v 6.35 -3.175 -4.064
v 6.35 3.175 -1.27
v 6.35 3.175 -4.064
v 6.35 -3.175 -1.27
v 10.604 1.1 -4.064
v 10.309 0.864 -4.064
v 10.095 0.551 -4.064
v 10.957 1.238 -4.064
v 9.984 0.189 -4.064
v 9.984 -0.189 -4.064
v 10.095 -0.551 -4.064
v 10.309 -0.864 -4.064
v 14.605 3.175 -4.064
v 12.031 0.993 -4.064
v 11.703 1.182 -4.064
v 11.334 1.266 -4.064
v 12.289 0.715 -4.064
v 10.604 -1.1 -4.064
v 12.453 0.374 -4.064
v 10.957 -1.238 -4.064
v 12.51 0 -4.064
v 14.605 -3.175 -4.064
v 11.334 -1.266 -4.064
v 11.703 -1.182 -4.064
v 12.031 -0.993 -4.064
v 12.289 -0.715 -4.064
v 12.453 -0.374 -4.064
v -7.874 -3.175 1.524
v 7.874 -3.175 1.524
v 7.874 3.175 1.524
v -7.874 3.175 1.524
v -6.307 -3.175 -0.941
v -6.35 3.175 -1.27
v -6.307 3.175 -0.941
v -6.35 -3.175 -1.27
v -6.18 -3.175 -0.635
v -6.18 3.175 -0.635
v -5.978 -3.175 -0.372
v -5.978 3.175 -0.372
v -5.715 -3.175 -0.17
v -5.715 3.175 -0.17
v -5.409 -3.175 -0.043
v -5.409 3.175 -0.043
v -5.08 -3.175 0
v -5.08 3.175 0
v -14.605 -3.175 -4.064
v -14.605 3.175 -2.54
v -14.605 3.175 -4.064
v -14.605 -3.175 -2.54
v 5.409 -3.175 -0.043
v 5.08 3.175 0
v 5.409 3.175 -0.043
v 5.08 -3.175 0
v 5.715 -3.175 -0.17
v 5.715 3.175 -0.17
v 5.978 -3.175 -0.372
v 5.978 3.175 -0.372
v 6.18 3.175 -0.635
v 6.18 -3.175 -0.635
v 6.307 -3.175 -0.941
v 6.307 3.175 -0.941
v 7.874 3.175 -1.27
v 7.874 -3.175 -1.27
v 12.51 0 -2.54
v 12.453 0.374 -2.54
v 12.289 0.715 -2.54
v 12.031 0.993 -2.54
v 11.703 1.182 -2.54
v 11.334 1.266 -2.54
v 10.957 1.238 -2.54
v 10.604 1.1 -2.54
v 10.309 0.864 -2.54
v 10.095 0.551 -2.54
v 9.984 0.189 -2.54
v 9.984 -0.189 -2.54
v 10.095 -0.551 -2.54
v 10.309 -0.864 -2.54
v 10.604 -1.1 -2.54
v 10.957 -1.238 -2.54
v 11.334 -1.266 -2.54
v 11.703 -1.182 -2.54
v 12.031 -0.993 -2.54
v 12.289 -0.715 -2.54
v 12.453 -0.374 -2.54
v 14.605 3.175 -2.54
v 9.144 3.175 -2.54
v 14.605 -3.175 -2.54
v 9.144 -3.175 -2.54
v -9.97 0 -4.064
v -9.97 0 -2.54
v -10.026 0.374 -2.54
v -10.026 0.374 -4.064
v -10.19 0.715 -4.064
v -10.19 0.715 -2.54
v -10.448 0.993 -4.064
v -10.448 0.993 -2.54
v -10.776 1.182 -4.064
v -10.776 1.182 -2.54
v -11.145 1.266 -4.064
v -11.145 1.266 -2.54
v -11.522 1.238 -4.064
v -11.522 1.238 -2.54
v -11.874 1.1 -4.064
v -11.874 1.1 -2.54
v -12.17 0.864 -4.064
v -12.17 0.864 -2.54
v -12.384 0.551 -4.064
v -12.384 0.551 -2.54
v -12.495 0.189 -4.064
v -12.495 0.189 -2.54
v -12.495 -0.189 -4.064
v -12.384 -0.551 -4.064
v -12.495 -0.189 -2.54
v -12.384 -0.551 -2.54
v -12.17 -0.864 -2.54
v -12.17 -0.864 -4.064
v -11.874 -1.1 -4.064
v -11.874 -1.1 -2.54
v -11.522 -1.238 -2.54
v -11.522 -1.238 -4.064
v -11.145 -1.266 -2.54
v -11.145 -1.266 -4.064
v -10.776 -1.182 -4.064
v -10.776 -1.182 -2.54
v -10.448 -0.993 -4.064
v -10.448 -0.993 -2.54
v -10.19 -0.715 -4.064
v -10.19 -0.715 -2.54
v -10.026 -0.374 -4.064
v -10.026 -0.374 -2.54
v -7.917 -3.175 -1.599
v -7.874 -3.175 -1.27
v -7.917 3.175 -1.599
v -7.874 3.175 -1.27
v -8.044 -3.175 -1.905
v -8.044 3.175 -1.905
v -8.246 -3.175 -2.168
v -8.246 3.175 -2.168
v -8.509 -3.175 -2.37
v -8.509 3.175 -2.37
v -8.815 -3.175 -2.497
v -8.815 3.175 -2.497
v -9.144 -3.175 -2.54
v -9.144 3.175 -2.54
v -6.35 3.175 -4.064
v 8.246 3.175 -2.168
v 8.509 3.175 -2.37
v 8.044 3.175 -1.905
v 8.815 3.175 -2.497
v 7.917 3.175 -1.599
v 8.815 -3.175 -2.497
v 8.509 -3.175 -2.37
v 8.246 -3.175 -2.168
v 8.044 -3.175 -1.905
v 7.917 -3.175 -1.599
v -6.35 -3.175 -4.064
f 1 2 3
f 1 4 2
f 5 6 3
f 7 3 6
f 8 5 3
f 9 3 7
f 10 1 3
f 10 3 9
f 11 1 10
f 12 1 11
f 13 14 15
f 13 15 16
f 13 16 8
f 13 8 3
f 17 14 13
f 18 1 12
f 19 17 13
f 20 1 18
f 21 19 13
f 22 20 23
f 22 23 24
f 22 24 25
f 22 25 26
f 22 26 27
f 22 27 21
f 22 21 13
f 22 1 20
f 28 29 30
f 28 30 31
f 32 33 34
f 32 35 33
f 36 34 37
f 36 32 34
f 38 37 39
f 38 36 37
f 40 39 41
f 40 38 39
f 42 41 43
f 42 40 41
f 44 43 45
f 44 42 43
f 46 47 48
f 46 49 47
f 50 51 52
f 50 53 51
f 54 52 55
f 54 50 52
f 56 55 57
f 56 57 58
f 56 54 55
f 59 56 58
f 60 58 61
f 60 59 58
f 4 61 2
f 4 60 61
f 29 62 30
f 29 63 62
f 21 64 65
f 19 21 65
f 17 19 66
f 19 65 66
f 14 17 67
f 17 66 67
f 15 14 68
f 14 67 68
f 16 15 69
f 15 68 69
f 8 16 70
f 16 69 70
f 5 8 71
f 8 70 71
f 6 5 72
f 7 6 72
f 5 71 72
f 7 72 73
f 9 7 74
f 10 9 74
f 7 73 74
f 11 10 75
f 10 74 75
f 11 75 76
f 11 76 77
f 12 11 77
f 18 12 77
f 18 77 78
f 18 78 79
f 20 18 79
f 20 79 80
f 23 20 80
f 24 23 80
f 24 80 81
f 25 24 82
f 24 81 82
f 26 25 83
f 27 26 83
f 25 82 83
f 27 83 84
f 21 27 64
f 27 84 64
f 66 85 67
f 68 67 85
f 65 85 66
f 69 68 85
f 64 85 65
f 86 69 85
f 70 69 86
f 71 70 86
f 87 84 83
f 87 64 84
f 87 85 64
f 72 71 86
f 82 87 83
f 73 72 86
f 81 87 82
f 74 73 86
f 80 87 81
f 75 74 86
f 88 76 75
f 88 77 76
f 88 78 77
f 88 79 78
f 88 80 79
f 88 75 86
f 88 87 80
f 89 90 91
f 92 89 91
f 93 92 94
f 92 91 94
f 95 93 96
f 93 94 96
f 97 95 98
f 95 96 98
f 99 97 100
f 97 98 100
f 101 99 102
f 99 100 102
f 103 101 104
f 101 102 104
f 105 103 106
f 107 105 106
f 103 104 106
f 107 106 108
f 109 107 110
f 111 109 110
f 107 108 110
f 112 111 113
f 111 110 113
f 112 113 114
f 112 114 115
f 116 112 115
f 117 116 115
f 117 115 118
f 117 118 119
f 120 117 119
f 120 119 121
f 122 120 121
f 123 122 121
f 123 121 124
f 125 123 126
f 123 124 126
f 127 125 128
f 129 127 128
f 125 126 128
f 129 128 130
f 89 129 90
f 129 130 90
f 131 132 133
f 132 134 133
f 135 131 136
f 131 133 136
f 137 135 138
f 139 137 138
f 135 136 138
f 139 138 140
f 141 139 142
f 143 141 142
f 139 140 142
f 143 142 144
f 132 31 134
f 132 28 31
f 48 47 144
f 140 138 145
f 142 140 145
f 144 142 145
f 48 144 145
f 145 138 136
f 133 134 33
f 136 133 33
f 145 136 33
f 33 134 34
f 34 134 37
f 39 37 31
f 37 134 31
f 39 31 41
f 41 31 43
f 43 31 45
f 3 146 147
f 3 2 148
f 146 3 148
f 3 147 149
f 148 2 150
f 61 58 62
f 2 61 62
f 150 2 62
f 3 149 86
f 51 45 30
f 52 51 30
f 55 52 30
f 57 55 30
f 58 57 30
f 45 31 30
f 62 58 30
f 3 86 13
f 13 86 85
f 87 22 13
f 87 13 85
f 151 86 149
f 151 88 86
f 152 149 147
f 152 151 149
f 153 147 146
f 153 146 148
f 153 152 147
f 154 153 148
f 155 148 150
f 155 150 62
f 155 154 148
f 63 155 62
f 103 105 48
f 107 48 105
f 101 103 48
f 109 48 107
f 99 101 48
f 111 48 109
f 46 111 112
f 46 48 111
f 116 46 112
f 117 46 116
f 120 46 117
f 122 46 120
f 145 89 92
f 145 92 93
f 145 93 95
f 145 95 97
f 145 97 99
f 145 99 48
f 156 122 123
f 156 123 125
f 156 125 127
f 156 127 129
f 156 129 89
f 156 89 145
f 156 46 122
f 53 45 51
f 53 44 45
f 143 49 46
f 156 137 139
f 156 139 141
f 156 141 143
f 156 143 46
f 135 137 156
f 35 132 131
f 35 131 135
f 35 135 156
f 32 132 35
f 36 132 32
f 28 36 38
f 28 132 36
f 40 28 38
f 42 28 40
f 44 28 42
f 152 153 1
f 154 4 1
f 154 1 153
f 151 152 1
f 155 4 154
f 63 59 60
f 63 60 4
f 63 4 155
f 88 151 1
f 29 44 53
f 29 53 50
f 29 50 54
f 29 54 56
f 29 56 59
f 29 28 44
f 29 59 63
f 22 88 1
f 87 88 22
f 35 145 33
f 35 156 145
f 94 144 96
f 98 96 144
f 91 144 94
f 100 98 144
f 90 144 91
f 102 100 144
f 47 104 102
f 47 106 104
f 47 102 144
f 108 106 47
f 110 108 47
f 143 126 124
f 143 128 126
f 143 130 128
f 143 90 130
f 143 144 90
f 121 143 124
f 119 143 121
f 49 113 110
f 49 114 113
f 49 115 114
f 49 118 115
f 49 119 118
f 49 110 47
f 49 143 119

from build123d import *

# Parameters (mm, degrees)
F1_DEPTH = 3.175
F2_R     = 1.27
F3_DEPTH = 1.524
F4_R     = 1.27


with BuildPart() as f1:
    # F0 (on Front) → F1 (new body, symmetric)
    with BuildSketch(Plane.XZ):
        Polygon((-14.605, -4.064), (-6.35, -4.064), (-6.35, 0), (6.35, 0), (6.35, -4.064), (14.605, -4.064), (14.605, -2.54), (7.874, -2.54), (7.874, 1.524), (-7.874, 1.524), (-7.874, -2.54), (-14.605, -2.54), align=None)
    extrude(amount=F1_DEPTH, both=True)

    # F2 (on face) → F3 (cut, through all)
    with BuildSketch(Plane.XY.offset(-2.54)):
        with Locations((-11.2395, 0)):
            Circle(F2_R)
        with Locations((11.2395, 0)):
            Circle(F2_R)
    extrude(amount=-F3_DEPTH, mode=Mode.SUBTRACT)

    # F4
    f4_edges = [f1.edges().sort_by_distance(p)[0] for p in [
        (-6.35, 0, 0),
        (6.35, 0, 0),
        (-7.874, 0, -2.54),
        (7.874, 0, -2.54),
    ]]
    fillet(f4_edges, radius=F4_R)


solid = f1.part
